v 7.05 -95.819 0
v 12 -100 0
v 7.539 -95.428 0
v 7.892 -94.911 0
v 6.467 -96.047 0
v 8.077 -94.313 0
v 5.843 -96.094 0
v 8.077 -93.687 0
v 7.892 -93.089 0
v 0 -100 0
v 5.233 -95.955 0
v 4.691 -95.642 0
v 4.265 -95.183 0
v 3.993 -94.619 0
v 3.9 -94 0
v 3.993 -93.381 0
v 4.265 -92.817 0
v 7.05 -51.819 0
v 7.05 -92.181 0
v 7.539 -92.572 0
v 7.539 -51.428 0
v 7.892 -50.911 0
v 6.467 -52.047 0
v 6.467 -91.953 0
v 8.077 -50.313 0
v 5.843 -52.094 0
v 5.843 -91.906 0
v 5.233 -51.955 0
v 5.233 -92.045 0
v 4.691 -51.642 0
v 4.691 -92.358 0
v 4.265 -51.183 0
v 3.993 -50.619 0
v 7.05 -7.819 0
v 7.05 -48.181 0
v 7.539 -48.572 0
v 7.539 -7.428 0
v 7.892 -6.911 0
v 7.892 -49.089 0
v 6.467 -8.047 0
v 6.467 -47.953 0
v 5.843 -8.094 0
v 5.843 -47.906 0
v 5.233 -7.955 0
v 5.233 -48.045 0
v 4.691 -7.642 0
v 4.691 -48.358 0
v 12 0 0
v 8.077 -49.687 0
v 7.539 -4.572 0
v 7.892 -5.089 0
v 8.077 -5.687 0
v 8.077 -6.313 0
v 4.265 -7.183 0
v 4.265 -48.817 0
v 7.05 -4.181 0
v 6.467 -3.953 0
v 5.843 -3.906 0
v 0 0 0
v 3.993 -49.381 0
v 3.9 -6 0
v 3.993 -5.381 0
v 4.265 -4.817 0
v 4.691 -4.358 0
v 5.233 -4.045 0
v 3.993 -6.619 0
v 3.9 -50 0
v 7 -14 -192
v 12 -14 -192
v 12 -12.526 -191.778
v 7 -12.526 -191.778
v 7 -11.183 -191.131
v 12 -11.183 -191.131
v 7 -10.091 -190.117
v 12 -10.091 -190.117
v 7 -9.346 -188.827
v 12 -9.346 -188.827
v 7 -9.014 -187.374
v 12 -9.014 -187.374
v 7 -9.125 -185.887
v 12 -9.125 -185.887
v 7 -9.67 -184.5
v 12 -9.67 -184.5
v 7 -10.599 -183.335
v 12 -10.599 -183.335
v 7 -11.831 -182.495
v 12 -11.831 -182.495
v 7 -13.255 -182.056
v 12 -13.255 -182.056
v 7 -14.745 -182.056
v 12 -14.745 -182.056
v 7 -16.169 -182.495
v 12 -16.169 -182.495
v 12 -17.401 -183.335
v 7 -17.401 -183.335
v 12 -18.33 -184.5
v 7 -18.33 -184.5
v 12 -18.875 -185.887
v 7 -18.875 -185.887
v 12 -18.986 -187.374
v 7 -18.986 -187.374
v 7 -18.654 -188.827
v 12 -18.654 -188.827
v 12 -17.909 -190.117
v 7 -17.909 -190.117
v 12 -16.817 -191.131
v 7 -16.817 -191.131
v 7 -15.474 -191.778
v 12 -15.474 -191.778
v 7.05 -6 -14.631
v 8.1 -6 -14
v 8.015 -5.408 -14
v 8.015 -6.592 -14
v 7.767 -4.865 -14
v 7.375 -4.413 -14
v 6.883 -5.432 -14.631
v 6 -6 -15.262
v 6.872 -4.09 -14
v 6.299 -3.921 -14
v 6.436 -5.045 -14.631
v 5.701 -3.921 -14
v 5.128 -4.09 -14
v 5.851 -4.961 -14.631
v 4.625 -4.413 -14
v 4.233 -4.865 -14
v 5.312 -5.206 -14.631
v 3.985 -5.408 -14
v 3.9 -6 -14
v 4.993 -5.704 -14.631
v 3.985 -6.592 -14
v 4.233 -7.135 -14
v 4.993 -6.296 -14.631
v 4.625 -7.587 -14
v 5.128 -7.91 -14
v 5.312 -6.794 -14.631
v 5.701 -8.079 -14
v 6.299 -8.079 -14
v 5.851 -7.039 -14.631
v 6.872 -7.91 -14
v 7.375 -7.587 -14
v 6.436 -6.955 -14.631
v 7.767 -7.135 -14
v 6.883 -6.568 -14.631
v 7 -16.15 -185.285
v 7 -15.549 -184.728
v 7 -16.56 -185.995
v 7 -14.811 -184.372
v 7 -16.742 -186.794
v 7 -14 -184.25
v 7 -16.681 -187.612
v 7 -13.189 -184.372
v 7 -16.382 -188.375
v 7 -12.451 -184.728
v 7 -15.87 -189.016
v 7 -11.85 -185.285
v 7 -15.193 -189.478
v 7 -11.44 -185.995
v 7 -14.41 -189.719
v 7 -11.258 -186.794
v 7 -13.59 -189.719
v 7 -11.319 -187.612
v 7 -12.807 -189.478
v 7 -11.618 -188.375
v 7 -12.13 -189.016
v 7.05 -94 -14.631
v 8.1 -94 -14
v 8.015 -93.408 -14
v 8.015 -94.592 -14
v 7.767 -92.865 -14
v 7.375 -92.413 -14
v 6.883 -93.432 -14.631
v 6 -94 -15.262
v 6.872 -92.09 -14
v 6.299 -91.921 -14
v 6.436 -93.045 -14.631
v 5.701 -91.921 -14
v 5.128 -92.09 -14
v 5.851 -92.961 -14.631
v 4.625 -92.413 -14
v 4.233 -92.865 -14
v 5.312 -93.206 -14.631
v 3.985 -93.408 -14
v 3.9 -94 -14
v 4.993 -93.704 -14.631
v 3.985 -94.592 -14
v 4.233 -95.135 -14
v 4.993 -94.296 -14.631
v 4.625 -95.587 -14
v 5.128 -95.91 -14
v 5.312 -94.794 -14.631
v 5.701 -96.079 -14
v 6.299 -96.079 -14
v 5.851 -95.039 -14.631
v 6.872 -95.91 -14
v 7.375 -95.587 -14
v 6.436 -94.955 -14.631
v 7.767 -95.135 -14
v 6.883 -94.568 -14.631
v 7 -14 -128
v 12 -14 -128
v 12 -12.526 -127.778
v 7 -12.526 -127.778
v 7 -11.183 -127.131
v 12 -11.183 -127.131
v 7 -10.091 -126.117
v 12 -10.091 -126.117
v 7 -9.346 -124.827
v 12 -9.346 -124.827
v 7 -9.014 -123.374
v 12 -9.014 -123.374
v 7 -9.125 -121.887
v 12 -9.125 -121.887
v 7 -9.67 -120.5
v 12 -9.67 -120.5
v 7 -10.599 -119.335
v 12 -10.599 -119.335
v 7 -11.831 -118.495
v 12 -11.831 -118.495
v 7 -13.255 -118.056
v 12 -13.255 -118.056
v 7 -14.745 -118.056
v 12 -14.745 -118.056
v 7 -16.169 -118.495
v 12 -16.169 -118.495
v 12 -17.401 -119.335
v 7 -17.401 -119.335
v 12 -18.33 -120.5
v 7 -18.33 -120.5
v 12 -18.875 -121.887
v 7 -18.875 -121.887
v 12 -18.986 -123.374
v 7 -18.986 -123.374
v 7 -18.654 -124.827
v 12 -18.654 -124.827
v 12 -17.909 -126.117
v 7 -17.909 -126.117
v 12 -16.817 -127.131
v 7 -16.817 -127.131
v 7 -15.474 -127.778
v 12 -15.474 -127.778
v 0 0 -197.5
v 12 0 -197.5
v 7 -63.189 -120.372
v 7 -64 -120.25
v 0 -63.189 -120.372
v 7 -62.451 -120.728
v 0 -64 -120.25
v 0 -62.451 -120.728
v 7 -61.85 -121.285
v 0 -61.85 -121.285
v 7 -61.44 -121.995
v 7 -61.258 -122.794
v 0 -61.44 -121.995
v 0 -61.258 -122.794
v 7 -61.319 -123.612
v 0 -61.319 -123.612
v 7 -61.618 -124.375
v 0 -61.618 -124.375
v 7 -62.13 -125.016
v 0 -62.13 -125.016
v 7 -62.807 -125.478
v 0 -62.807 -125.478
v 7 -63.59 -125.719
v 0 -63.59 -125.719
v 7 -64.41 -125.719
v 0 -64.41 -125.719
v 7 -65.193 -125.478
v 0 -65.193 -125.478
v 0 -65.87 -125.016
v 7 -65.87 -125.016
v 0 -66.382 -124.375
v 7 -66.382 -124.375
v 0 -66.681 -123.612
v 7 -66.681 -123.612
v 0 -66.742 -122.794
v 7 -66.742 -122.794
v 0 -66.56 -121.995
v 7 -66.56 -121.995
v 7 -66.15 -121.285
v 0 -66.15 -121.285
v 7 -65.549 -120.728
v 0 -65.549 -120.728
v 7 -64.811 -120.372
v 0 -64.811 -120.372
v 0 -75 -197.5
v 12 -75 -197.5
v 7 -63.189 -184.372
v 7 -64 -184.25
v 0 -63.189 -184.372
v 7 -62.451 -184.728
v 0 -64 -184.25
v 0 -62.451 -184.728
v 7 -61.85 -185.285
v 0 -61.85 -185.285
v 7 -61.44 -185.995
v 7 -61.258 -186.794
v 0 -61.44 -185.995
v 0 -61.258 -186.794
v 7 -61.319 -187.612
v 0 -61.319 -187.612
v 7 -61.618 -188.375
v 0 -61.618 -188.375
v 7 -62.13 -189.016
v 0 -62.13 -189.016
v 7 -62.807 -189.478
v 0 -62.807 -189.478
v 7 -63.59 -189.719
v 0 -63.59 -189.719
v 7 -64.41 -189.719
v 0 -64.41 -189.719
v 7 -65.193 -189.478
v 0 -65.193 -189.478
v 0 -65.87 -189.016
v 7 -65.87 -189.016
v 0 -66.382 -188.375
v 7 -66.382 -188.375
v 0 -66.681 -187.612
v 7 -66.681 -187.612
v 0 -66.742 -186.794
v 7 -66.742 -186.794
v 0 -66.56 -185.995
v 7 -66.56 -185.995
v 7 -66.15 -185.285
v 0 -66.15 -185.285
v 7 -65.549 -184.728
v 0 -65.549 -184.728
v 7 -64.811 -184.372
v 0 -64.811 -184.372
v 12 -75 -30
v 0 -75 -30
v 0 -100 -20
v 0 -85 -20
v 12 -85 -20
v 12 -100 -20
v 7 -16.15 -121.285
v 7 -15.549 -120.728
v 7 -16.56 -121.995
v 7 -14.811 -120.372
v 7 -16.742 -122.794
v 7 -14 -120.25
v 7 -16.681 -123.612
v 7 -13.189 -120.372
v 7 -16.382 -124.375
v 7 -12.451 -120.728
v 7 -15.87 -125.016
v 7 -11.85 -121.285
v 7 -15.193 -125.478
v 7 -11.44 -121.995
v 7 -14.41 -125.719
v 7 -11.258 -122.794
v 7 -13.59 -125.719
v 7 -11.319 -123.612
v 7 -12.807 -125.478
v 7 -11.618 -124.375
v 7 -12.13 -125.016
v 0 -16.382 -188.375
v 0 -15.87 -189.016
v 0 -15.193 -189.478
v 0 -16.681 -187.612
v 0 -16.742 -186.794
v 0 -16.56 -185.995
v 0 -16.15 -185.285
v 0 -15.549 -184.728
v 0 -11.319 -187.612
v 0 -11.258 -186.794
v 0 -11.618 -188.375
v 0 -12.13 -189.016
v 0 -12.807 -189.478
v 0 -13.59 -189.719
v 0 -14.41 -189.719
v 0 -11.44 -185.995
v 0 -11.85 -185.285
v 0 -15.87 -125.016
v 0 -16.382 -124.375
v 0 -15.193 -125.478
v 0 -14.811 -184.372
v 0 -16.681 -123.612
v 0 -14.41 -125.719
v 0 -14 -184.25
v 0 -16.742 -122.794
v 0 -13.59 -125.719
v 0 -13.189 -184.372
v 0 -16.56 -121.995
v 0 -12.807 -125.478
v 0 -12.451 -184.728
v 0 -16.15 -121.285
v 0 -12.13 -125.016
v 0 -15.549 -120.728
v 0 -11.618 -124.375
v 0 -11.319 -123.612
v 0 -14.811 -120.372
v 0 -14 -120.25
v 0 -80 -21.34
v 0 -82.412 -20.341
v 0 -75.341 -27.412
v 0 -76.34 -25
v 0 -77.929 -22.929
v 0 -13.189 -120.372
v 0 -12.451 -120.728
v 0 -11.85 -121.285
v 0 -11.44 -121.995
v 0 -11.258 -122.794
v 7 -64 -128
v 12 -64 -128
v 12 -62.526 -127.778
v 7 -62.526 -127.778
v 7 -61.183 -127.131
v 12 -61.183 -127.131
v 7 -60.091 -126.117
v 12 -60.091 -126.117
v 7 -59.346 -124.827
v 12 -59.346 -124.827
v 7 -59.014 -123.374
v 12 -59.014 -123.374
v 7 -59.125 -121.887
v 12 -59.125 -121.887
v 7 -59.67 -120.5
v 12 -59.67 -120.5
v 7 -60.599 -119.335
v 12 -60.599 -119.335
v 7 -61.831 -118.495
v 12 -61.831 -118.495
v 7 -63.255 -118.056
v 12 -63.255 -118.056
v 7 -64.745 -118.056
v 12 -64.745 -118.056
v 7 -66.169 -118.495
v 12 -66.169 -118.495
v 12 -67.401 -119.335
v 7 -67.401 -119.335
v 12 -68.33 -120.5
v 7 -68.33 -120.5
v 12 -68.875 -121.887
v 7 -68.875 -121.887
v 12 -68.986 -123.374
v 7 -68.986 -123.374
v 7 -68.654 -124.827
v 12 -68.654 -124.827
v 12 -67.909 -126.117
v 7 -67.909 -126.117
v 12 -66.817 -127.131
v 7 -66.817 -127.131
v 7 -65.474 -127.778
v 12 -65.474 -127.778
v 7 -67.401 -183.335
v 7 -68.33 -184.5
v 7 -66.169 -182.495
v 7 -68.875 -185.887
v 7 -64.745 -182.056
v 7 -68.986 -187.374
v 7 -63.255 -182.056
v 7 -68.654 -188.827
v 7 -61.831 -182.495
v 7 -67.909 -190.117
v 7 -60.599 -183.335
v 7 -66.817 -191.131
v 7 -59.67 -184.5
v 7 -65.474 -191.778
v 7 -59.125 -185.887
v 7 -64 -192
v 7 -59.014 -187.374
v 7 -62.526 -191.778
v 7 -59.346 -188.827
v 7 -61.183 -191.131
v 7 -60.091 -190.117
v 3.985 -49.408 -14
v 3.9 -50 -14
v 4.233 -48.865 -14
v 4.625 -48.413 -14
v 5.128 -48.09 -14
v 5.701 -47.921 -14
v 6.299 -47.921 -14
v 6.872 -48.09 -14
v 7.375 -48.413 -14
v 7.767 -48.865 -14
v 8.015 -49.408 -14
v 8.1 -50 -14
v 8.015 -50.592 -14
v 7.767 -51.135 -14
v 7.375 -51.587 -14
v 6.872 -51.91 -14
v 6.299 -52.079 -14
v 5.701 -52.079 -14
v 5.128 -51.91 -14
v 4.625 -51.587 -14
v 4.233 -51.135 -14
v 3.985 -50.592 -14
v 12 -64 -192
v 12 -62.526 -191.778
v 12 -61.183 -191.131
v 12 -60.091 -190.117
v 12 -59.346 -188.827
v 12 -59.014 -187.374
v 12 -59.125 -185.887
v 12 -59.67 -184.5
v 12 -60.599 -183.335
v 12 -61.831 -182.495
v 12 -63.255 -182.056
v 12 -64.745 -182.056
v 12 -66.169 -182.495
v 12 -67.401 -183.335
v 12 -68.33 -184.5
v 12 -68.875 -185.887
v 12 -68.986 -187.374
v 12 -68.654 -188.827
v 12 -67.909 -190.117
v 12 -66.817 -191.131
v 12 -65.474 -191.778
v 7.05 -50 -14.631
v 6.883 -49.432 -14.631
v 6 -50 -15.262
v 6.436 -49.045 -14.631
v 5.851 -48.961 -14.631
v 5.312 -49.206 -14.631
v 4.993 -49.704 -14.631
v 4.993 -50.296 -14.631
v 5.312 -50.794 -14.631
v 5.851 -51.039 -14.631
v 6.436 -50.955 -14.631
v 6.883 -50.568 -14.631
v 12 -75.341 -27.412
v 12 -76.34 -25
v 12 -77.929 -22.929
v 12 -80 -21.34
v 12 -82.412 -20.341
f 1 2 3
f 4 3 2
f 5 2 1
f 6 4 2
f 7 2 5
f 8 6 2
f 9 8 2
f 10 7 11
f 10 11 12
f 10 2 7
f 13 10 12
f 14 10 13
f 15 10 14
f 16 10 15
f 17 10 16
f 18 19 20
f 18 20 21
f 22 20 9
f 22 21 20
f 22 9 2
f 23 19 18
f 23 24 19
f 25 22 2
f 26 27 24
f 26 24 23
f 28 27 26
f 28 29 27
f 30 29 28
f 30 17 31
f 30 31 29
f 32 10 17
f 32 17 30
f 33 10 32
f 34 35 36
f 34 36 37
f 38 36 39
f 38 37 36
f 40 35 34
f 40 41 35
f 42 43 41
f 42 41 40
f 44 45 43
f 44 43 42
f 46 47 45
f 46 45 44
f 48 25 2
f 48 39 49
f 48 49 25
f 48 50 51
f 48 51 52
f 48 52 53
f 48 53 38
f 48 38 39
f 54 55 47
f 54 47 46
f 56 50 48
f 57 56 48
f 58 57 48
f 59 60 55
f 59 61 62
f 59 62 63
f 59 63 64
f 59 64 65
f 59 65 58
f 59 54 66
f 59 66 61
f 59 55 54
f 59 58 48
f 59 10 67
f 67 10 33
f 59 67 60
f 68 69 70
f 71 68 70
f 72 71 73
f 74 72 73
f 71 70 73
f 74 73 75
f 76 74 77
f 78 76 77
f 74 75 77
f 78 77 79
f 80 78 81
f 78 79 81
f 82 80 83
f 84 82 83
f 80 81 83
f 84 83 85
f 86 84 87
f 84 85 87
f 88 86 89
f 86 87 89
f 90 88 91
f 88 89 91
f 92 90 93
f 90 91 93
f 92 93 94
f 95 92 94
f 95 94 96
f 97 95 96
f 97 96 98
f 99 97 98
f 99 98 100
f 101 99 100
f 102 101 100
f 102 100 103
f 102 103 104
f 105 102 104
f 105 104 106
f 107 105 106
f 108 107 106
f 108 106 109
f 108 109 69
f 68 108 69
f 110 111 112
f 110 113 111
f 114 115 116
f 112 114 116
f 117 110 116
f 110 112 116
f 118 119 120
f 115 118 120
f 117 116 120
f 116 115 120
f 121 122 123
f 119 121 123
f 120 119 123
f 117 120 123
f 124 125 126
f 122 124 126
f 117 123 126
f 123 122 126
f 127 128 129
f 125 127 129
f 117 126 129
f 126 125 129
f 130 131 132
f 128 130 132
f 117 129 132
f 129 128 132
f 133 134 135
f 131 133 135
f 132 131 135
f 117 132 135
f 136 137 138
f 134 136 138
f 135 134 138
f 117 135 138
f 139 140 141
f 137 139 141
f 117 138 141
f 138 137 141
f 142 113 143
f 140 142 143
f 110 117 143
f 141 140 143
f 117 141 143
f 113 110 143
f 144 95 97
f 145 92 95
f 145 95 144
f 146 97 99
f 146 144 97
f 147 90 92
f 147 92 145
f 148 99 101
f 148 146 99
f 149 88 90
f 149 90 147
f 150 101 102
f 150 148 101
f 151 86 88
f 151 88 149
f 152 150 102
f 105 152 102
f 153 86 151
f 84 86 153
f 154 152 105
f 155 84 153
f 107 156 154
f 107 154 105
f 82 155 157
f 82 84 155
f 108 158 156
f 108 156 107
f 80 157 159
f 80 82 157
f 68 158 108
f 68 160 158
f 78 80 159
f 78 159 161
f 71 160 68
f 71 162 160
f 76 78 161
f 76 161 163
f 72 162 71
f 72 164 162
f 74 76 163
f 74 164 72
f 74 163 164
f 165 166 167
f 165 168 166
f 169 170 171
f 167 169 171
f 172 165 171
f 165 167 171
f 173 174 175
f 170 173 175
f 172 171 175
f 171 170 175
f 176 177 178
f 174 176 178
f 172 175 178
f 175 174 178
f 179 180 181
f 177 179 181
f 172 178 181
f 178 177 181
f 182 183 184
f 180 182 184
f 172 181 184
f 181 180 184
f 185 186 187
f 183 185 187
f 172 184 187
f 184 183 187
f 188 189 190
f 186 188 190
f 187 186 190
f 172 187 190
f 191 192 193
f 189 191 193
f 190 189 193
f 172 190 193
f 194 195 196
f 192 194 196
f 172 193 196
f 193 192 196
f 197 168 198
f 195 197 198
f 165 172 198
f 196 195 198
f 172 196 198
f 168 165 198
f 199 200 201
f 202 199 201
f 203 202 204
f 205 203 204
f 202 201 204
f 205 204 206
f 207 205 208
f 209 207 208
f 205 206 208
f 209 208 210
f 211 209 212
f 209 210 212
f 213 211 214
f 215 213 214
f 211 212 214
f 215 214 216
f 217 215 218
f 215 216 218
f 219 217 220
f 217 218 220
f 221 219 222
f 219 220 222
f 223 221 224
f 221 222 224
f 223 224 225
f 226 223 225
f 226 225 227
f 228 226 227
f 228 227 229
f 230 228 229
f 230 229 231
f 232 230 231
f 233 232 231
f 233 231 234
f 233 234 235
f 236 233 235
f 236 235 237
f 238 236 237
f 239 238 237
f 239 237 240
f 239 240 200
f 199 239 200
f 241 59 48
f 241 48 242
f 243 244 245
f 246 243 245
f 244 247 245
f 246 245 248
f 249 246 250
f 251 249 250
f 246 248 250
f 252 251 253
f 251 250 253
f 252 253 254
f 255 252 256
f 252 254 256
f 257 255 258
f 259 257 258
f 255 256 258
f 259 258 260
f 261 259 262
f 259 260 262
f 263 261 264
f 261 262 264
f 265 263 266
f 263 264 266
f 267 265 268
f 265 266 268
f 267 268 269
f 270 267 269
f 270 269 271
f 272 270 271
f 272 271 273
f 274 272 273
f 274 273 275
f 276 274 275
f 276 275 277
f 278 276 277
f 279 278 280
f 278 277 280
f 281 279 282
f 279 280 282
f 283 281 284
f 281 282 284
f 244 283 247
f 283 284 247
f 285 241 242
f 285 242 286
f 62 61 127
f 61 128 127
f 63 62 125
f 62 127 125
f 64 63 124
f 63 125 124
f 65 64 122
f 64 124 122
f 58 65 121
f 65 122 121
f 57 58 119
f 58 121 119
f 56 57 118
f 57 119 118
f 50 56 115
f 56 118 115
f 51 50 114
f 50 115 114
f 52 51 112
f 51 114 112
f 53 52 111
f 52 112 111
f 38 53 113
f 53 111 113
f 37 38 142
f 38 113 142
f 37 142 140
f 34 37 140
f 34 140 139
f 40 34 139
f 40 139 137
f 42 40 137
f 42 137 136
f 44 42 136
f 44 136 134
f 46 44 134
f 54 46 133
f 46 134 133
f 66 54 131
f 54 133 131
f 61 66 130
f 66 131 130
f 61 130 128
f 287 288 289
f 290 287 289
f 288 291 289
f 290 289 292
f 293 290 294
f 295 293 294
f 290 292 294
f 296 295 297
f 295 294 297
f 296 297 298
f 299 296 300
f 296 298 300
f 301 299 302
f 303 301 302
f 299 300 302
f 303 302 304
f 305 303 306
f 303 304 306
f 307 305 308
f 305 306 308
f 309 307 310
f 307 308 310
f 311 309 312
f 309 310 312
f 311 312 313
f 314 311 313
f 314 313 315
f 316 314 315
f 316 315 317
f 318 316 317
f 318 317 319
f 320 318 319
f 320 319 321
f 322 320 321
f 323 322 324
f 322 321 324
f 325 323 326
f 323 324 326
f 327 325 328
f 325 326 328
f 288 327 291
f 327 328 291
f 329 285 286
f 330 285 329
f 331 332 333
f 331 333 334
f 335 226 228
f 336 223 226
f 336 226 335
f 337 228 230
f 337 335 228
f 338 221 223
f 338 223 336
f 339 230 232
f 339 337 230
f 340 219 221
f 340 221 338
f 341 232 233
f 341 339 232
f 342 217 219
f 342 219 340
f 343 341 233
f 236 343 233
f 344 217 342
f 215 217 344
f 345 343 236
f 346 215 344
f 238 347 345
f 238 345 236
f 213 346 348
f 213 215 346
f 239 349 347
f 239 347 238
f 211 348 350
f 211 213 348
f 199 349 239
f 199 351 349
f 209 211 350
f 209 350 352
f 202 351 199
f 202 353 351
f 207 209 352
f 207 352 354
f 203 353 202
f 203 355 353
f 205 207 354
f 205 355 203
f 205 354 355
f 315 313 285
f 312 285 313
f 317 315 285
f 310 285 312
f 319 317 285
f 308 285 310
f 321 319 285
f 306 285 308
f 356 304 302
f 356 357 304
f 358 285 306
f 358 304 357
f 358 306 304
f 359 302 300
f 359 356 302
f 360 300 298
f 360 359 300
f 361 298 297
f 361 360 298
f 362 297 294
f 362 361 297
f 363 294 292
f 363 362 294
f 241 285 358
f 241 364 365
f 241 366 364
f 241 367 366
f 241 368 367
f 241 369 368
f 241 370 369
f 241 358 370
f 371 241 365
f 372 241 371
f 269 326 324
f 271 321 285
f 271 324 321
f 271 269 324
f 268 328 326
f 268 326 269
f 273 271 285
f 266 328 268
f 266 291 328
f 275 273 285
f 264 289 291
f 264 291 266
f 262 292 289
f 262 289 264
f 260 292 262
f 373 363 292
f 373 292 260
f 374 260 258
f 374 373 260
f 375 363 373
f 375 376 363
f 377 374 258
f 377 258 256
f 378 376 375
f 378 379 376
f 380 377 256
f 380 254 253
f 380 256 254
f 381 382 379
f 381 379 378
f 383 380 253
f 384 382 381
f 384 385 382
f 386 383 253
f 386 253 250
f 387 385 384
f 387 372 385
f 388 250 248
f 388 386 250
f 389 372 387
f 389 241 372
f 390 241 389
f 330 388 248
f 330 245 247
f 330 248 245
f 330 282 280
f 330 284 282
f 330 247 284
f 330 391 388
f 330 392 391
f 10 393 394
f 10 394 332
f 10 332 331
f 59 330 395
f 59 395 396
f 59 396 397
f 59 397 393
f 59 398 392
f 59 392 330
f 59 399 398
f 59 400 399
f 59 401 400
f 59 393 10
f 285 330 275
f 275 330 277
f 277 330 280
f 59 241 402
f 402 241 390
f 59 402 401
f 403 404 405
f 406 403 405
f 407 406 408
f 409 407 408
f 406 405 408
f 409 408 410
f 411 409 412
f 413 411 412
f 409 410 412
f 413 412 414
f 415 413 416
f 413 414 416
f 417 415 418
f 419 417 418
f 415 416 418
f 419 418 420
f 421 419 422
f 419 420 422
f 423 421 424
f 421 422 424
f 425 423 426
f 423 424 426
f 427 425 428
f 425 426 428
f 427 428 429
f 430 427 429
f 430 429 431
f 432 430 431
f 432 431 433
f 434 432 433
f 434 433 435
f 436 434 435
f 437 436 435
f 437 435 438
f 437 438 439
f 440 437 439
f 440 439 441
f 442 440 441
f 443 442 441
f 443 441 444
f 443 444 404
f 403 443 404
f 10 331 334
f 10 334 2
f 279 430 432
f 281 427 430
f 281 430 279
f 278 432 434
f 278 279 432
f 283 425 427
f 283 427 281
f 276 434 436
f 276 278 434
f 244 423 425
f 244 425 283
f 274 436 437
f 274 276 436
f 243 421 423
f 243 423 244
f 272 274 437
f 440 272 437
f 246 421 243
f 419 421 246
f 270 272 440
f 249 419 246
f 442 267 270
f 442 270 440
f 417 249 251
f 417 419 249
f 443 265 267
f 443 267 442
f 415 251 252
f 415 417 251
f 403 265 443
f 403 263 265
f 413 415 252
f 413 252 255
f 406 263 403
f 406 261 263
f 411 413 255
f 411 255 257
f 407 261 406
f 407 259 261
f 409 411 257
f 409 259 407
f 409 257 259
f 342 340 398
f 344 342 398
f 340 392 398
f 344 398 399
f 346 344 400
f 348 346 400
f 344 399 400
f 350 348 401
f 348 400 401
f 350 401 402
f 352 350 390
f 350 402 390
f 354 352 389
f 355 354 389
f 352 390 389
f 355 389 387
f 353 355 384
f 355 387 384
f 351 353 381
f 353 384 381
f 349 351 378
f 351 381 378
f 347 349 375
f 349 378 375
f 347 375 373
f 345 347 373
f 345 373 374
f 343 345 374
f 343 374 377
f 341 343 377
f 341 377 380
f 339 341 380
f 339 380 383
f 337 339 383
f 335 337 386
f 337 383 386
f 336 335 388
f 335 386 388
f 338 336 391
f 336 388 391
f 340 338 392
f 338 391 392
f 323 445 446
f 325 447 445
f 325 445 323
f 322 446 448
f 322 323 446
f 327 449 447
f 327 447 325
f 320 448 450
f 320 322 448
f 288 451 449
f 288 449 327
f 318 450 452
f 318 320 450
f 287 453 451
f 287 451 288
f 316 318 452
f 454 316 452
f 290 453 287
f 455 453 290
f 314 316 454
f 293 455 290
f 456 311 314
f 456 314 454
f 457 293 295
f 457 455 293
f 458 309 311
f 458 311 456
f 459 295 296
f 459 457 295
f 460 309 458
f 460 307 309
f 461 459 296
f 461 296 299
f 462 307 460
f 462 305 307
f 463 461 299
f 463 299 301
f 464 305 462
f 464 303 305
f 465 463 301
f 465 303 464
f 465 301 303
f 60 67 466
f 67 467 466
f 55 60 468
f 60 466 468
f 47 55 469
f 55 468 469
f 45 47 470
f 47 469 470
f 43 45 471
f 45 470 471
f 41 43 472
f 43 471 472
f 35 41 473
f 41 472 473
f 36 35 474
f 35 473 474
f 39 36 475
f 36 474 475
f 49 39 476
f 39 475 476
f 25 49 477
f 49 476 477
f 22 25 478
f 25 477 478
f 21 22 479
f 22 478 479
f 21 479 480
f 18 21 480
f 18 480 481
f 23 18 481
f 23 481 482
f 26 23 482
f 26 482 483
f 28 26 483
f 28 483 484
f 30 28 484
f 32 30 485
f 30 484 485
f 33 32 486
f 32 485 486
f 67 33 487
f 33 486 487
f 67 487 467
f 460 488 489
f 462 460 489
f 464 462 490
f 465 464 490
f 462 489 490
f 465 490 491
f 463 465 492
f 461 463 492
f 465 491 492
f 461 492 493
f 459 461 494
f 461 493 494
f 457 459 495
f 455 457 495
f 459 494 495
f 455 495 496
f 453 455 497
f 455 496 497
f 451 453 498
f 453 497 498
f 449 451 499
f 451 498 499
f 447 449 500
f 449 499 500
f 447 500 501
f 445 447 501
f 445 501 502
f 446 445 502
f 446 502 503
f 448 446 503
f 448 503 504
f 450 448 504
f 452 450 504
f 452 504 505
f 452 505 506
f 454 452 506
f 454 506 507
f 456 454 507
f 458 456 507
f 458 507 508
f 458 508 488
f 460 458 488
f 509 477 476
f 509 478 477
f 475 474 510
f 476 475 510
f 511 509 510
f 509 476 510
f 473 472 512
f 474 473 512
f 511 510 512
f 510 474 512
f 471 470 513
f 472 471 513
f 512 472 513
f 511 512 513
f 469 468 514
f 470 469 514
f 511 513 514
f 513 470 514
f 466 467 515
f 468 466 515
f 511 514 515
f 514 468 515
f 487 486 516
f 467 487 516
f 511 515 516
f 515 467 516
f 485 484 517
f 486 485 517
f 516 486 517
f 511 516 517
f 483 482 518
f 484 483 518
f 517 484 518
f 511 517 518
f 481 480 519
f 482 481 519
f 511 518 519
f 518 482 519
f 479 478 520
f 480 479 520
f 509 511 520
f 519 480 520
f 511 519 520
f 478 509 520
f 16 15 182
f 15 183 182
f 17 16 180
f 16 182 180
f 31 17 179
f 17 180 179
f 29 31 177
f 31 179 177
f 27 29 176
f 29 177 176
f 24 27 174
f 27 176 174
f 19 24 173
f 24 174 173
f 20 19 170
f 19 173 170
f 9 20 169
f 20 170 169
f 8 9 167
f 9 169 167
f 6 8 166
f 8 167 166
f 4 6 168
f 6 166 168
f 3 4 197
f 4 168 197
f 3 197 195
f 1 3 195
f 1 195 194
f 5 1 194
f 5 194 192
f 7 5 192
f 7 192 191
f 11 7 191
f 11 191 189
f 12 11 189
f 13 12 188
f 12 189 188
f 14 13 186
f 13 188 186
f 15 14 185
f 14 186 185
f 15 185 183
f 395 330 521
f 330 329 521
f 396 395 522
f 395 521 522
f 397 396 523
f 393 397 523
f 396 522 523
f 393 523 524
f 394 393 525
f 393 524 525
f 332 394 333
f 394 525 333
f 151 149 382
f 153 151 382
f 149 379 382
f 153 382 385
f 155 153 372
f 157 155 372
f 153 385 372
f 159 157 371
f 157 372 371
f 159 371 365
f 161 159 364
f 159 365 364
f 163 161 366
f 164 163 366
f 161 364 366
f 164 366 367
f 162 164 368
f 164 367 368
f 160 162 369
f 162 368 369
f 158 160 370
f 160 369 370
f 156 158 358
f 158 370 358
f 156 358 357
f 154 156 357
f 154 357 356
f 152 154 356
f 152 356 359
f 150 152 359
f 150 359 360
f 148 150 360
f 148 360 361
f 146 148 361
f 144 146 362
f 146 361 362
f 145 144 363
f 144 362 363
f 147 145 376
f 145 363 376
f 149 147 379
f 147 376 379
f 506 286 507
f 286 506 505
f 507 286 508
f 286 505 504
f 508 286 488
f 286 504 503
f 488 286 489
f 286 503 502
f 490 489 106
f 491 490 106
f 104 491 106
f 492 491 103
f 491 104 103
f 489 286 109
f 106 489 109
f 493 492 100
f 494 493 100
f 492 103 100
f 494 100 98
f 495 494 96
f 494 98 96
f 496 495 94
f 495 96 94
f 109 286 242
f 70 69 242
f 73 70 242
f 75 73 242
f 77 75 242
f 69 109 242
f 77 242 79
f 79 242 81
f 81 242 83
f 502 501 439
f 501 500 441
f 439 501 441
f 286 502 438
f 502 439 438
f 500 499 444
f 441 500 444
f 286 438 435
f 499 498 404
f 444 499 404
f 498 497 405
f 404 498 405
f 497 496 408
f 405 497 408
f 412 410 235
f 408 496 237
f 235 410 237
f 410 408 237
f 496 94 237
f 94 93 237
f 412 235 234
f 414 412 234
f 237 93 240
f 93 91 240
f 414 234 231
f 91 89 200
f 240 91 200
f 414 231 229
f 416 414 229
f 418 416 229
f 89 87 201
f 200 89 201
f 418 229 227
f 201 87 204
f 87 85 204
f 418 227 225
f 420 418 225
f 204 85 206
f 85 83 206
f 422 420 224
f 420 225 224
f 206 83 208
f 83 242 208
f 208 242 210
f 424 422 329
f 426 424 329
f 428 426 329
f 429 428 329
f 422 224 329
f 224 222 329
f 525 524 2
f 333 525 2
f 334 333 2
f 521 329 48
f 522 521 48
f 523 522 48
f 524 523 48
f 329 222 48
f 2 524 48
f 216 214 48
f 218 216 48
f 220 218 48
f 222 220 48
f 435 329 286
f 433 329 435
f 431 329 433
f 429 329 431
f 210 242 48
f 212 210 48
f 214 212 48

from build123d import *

# Parameters (mm, degrees)
BOSS_EXTRUDE1_DEPTH                             = 12
FILLET1_R                                       = 10
M5X0_8_TAPPED_HOLE1_D                           = 4.2
M5X0_8_TAPPED_HOLE1_DEPTH                       = 14
M5X0_8_TAPPED_HOLE1_TIP                         = 1.2618073
CBORE_FOR_M5_SOCKET_HEAD_CAP_SCREW1_D           = 5.5
CBORE_FOR_M5_SOCKET_HEAD_CAP_SCREW1_CBORE_D     = 10
CBORE_FOR_M5_SOCKET_HEAD_CAP_SCREW1_CBORE_DEPTH = 5


with BuildPart() as part:
    # Sketch1 → Boss-Extrude1 (new body)
    with BuildSketch(Plane(origin=(0, 0, 0), x_dir=(0, 0, -1), z_dir=(1, 0, 0))):
        Polygon((0, 0), (197.5, 0), (197.5, -75), (20, -75), (20, -100), (0, -100), align=None)
    extrude(amount=BOSS_EXTRUDE1_DEPTH)

    # Fillet1
    fillet1_edges = [part.edges().sort_by_distance(p)[0] for p in [
        (6, -75, -20),
    ]]
    fillet(fillet1_edges, radius=FILLET1_R)

    # M5x0.8 Tapped Hole1
    with Locations(Plane.XY):
        with Locations((6, -6), (6, -50), (6, -94)):
            Hole(M5X0_8_TAPPED_HOLE1_D / 2, depth=M5X0_8_TAPPED_HOLE1_DEPTH)
            with Locations((0, 0, -(M5X0_8_TAPPED_HOLE1_DEPTH + M5X0_8_TAPPED_HOLE1_TIP / 2))):  # 118° drill point
                Cone(0, M5X0_8_TAPPED_HOLE1_D / 2, M5X0_8_TAPPED_HOLE1_TIP, mode=Mode.SUBTRACT)

    # CBORE for M5 Socket Head Cap Screw1 (through all)
    with Locations(Plane(origin=(12, 0, 0), x_dir=(0, 0, -1), z_dir=(1, 0, 0))):
        with Locations((123, -14), (123, -64), (187, -64), (187, -14)):
            CounterBoreHole(CBORE_FOR_M5_SOCKET_HEAD_CAP_SCREW1_D / 2, CBORE_FOR_M5_SOCKET_HEAD_CAP_SCREW1_CBORE_D / 2, CBORE_FOR_M5_SOCKET_HEAD_CAP_SCREW1_CBORE_DEPTH)


solid = part.part
